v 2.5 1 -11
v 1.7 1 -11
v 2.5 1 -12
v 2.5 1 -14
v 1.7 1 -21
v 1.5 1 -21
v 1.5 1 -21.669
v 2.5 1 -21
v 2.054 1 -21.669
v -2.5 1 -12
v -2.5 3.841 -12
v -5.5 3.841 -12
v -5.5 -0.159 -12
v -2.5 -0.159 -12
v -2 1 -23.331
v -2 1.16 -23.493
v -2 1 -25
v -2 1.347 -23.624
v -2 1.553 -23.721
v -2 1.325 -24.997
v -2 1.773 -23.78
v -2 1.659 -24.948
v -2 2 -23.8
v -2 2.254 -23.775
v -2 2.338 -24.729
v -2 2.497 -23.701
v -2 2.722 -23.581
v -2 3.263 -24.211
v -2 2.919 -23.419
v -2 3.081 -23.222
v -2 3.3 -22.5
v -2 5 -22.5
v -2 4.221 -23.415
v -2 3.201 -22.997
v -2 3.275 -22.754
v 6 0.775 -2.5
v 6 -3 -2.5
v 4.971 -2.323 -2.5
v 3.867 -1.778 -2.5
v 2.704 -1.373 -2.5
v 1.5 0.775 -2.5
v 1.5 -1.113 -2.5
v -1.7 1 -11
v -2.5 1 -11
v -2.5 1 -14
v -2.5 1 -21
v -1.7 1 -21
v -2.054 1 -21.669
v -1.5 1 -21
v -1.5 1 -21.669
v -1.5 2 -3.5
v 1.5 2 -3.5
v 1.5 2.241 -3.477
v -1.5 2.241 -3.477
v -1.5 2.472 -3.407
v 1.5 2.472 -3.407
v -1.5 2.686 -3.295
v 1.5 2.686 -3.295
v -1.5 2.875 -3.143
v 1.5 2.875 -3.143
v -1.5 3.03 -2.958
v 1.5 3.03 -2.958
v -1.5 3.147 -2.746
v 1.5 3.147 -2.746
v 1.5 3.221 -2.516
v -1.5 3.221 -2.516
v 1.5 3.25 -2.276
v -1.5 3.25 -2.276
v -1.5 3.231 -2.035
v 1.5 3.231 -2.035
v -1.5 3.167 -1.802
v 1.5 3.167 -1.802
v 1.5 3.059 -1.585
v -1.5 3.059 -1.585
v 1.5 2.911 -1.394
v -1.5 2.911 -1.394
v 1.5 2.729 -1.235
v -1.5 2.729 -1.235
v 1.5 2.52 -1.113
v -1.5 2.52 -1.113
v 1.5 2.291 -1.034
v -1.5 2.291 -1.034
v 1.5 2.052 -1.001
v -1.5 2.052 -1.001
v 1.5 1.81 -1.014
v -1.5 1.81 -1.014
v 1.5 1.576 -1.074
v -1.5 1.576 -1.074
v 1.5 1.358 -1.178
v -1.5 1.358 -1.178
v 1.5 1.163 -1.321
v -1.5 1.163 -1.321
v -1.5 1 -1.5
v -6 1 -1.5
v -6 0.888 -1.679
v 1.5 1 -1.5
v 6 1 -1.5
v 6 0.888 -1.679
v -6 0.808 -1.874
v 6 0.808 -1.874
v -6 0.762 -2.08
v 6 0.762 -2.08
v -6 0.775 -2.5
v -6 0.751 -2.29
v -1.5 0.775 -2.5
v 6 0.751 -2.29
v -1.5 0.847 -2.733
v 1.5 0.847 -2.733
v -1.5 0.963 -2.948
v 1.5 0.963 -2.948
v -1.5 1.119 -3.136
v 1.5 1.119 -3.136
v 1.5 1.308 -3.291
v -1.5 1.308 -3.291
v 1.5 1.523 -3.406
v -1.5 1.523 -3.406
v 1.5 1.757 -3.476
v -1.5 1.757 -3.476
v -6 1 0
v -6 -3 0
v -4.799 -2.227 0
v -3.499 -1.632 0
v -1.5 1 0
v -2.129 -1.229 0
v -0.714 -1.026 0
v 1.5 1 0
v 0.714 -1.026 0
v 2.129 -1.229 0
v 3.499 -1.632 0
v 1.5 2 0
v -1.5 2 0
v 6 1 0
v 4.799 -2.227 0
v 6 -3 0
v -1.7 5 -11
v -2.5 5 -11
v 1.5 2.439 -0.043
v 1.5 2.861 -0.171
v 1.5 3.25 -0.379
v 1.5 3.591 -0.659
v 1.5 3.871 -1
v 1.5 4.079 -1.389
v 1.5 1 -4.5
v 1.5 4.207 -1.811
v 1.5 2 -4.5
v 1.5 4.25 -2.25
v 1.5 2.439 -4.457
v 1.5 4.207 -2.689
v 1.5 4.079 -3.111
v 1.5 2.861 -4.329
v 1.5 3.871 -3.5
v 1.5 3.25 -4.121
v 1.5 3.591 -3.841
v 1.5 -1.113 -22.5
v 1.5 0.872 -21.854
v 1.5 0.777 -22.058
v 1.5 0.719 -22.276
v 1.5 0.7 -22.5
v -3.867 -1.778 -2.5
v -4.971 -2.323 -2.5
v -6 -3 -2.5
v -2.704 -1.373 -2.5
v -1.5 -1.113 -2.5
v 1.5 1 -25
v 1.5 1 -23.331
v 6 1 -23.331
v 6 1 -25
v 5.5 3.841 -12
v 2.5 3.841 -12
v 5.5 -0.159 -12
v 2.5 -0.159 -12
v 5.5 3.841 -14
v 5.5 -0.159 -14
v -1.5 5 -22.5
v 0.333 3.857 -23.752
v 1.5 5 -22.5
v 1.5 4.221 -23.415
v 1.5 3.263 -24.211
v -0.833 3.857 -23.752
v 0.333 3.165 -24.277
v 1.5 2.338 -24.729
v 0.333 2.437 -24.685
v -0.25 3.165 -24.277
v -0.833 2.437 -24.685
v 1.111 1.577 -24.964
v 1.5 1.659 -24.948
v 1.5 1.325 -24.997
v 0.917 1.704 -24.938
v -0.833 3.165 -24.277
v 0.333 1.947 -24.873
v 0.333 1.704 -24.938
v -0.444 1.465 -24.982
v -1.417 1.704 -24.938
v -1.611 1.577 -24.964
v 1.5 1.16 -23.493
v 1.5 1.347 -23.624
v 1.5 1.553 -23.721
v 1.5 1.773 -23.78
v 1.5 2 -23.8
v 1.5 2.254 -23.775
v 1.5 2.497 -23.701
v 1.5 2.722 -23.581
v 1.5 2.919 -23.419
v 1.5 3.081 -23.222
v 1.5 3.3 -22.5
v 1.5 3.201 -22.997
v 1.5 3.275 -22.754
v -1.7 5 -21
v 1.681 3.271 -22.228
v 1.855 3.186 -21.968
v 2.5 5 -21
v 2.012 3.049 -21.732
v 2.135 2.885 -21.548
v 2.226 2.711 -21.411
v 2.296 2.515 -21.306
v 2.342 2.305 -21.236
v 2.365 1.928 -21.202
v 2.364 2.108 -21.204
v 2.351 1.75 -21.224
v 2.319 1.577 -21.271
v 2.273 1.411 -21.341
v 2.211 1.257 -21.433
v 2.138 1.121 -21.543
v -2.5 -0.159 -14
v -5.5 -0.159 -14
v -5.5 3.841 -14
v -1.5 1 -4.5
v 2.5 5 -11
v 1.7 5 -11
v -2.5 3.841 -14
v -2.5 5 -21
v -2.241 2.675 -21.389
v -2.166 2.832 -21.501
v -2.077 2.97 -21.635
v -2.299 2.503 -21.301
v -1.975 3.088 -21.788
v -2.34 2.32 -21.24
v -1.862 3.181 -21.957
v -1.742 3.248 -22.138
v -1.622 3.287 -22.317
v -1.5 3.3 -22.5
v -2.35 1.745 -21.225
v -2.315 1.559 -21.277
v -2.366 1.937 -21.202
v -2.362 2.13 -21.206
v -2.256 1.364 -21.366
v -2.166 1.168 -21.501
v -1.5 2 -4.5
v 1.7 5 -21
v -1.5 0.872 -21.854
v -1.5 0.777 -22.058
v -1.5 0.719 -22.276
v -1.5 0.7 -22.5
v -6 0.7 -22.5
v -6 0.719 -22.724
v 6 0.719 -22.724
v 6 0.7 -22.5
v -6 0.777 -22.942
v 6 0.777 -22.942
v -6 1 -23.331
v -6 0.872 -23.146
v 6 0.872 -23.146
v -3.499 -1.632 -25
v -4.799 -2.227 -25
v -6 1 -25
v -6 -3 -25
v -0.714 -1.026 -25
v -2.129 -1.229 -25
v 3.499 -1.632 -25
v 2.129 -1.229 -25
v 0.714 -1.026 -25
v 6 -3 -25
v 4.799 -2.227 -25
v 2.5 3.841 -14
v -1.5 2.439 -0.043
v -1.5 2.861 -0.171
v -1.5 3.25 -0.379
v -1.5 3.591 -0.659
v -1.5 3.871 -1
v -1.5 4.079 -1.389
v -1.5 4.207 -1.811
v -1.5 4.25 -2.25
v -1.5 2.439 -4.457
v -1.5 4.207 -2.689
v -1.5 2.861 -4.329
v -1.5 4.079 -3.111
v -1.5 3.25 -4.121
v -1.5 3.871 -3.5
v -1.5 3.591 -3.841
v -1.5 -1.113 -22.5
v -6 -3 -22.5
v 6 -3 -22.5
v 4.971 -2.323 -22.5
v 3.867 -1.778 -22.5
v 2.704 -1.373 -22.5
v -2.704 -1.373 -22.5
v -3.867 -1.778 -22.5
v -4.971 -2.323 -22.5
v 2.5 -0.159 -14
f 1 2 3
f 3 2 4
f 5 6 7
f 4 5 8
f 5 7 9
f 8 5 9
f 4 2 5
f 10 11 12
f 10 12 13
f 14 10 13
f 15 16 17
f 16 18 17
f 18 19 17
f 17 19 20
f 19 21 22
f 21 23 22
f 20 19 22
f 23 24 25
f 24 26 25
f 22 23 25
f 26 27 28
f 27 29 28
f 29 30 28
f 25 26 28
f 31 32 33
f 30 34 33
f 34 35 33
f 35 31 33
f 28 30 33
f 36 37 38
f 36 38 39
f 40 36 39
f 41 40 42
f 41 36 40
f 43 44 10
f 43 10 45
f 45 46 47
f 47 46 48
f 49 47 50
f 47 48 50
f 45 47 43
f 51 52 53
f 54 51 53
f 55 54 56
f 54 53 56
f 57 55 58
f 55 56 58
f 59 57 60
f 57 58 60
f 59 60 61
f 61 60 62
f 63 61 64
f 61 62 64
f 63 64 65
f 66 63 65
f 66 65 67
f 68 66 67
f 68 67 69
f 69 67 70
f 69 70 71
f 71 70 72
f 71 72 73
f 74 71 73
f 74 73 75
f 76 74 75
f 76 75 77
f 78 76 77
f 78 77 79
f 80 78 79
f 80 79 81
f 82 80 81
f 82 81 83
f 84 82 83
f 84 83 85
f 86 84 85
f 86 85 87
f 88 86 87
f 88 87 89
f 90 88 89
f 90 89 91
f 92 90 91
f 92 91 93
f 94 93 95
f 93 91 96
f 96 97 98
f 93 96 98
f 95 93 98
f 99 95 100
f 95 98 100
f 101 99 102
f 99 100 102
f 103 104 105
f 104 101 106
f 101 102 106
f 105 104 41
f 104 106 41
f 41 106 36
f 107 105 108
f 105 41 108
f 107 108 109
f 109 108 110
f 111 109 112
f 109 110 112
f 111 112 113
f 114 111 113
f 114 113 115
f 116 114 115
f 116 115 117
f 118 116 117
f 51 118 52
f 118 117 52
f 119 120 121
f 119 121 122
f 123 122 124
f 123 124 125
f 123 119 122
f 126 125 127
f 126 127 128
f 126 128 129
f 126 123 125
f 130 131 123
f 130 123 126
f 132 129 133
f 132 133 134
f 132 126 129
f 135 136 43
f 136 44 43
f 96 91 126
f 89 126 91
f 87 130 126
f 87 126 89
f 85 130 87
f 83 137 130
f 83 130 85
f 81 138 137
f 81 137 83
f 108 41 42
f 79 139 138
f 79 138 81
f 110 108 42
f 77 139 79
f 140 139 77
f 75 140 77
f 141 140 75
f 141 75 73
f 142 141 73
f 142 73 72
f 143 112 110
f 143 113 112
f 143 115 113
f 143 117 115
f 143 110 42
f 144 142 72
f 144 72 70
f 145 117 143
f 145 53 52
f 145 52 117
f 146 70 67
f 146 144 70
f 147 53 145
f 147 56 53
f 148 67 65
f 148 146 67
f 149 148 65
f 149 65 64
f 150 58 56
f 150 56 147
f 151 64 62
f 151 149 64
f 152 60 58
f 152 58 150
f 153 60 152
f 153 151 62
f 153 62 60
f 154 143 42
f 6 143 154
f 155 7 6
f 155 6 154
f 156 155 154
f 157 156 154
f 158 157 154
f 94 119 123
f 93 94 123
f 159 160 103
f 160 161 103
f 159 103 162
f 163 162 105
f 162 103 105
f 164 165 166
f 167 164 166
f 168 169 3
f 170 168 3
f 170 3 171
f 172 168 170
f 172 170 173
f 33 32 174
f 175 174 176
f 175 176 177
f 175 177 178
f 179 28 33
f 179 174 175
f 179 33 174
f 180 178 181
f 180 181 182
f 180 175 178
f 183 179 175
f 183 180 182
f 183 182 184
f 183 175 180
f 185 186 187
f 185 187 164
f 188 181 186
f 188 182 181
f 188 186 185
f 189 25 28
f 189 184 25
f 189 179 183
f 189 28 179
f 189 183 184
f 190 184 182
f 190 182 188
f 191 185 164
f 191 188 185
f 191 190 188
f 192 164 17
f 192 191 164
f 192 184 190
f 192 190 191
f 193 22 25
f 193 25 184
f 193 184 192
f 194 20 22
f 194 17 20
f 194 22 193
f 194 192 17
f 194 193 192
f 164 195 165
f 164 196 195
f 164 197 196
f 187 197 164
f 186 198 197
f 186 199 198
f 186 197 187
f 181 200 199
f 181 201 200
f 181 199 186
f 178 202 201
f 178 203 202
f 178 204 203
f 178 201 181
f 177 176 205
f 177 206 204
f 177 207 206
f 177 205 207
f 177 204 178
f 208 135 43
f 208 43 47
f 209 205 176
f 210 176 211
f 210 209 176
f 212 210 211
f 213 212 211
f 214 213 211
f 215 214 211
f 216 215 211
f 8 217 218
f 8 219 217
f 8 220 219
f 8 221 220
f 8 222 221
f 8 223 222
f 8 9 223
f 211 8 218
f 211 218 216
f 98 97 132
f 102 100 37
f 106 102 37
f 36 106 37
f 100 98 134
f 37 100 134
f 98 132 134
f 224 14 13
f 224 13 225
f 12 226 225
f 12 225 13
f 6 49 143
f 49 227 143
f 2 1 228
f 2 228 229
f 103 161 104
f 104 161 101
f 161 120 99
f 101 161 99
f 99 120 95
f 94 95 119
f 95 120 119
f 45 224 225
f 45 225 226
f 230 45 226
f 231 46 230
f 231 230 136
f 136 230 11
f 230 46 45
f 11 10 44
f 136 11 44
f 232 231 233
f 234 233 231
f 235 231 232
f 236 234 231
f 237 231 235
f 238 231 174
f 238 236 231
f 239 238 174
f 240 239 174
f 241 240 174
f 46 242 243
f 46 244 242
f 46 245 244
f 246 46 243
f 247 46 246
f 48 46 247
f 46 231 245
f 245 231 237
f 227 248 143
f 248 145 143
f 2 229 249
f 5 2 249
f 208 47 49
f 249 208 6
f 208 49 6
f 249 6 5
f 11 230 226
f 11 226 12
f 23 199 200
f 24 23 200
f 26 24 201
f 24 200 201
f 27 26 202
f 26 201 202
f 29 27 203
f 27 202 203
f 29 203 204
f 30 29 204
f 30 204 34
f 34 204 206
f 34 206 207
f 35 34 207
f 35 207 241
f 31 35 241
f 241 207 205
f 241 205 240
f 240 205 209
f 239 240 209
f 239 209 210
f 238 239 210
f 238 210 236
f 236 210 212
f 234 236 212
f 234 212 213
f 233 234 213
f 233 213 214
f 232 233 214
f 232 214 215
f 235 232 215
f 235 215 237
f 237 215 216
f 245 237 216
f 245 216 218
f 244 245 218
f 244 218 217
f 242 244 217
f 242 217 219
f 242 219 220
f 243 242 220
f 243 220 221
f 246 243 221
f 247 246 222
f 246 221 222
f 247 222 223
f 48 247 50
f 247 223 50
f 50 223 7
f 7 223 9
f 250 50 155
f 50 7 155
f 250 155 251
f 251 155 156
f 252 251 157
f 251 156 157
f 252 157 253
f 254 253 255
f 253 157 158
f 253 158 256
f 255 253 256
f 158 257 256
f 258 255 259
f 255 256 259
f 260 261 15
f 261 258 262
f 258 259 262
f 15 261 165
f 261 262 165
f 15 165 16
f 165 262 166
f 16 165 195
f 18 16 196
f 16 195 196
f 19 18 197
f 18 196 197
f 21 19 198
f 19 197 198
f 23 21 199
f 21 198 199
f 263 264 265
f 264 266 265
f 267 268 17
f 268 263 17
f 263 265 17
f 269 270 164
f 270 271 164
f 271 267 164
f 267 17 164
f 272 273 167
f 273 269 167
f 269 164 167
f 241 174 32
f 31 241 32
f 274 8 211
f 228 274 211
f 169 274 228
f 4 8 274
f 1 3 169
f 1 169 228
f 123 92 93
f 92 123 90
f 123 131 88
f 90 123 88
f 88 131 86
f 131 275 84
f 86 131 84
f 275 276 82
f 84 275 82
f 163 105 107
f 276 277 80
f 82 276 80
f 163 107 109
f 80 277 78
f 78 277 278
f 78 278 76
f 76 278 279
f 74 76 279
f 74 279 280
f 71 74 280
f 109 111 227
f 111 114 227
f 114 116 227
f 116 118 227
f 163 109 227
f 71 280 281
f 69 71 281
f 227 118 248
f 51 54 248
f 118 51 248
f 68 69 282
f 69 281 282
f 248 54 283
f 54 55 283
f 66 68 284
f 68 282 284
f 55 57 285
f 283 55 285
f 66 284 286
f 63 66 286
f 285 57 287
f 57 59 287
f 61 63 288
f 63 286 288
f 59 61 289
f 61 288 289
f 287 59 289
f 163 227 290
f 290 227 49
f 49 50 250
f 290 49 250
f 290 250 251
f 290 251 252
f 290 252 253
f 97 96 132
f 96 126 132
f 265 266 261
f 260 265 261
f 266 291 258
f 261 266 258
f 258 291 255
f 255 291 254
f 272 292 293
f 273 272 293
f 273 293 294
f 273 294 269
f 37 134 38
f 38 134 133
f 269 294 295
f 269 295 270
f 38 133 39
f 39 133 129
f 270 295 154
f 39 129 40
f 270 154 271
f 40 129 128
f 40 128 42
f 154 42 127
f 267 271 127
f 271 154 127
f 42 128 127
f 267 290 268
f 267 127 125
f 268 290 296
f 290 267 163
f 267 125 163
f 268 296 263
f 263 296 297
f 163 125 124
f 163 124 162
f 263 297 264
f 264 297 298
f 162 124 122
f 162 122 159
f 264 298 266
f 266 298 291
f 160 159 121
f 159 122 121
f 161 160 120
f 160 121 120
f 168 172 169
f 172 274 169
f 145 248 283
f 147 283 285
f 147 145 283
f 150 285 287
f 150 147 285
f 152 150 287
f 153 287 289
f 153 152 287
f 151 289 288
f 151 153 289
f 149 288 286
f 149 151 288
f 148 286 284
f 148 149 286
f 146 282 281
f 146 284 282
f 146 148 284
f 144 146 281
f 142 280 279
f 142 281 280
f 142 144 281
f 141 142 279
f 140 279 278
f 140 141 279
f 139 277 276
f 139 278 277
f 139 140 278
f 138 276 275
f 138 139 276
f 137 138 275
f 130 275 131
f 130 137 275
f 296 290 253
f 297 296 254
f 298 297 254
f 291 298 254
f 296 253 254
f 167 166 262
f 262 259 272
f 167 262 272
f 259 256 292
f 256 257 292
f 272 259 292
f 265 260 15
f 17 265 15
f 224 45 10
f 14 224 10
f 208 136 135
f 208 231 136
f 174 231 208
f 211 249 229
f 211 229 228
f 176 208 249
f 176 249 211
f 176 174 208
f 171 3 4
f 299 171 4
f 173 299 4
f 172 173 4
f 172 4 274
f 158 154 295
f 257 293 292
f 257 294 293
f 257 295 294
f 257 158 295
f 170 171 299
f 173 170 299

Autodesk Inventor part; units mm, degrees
ref_plane "YZ Plane" through (0, 0, 0) normal (1, 0, 0) x (0, 1, 0)
ref_plane "XZ Plane" through (0, 0, 0) normal (0, 1, 0) x (-1, 0, 0)
sketch "Sketch1" plane through (0, 0, 0) normal (0, 0, 1) x (1, 0, 0)
  line L0 (-6, 1) -> (6, 1)
  line L1 (6, 1) -> (6, -1)
  line L2 (6, -1) -> (-6, -1)
  line L3 (-6, -1) -> (-6, 1)
  line L4 (-6, 1) -> (6, -1) construction
  line L5 (6, 1) -> (-6, -1) construction
  line L6 (-6, -1) -> (-6, -3)
  line L7 (6, -1) -> (6, -3)
  arc A0 (6, -3) -> (-6, -3) centre (0, -11) ccw
  point P0 (0, 0)
  dimension "d0" = 12
  dimension "d1" = 2
  dimension "d2" = 2
  dimension "d3" = 2
extrude "Extrusion1" add sketch "Sketch1" against normal blind 25
sketch "Sketch2" plane through (-6, 1, 0) normal (0, 1, 0) x (1, 0, 0)
  line L0 (12, 0) -> (12, 25) projected
  line L1 (0, 0) -> (0, 25) projected
  line L2 (0, 0) -> (0, 2.5)
  line L3 (12, 0) -> (12, 2.5)
  line L4 (0, 25) -> (0, 22.5)
  line L5 (12, 25) -> (12, 22.5)
  line L6 (0, 2.5) -> (4.5, 2.5)
  line L7 (4.5, 2.5) -> (4.5, 22.5)
  line L8 (4.5, 22.5) -> (0, 22.5)
  line L9 (0, 22.5) -> (0, 2.5)
  line L10 (12, 2.5) -> (7.5, 2.5)
  line L11 (7.5, 2.5) -> (7.5, 22.5)
  line L12 (7.5, 22.5) -> (12, 22.5)
  line L13 (12, 22.5) -> (12, 2.5)
  point P0 (6, 0)
  dimension "d6" = 2.5
  dimension "d7" = 2.5
  dimension "d8" = 2.5
  dimension "d9" = 2.5
  dimension "d10" = 12
  dimension "d11" = 4.5
  dimension "d12" = 4.5
extrude "Extrusion2" cut sketch "Sketch2" against normal blind 25
sketch "Sketch3" plane through (-6, 1, 0) normal (0, 1, 0) x (1, 0, 0)
  line L0 (7.5, 2.5) -> (7.5, 22.5) projected
  line L1 (4.5, 22.5) -> (4.5, 2.5) projected
  line L2 (0, 0) -> (0, 2.5) projected
  line L3 (4.5, 2.5) -> (4.5, 3.5)
  line L4 (7.5, 2.5) -> (7.5, 3.5)
  line L5 (4.5, 3.5) -> (4.5, 5)
  line L6 (4.5, 5) -> (5, 5)
  line L7 (5, 5) -> (5, 3.5)
  line L8 (5, 3.5) -> (4.5, 3.5)
  line L9 (7.5, 3.5) -> (7.5, 5)
  line L10 (7.5, 5) -> (7, 5)
  line L11 (7, 5) -> (7, 3.5)
  line L12 (7, 3.5) -> (7.5, 3.5)
  line L13 (4.5, 2.5) -> (4.5, 7)
  line L14 (4.5, 7) -> (0, 7)
  line L15 (0, 7) -> (0, 8.5)
  line L16 (0, 8.5) -> (4.5, 8.5)
  line L17 (7.5, 7) -> (12, 7)
  line L18 (12, 7) -> (12, 8.5)
  line L19 (12, 8.5) -> (7.5, 8.5)
  line L20 (4.5, 7) -> (4.5, 21)
  line L21 (7.5, 7) -> (7.5, 21)
  line L22 (4.5, 21) -> (7.5, 21)
  line L23 (7.5, 21) -> (7.5, 22.5)
  line L24 (7.5, 22.5) -> (4.5, 22.5)
  line L25 (4.5, 22.5) -> (4.5, 21)
  line L26 (4.5, 21) -> (3.5, 21)
  line L27 (3.5, 21) -> (3.5, 11)
  line L28 (3.5, 11) -> (4.5, 11)
  line L29 (4.5, 11) -> (4.5, 21)
  line L30 (7.5, 21) -> (8.5, 21)
  line L31 (8.5, 21) -> (8.5, 11)
  line L32 (8.5, 11) -> (7.5, 11)
  line L33 (7.5, 11) -> (7.5, 21)
  line L34 (3.5, 21) -> (4.5, 22.5)
  line L35 (7.5, 22.5) -> (8.5, 21)
  line L36 (7.5, 5) -> (8, 5)
  line L37 (8, 5) -> (8, 3.5)
  line L38 (8, 3.5) -> (7.5, 3.5)
  line L39 (4.5, 5) -> (4, 5)
  line L40 (4, 5) -> (4, 3.5)
  line L41 (4, 3.5) -> (5, 3.5)
  point P0 (12, 25)
  point P1 (12, 0)
  point P2 (6, 0)
  dimension "d15" = 1
  dimension "d16" = 1.5
  dimension "d17" = 0.5
  dimension "d18" = 0.5
  dimension "d19" = 4.5
  dimension "d20" = 1.5
  dimension "d21" = 14
  dimension "d22" = 4.5
  dimension "d23" = 4.5
  dimension "d24" = 14
  dimension "d25" = 25
  dimension "d26" = 1.5
  dimension "d29" = 1
  dimension "d30" = 10
  dimension "d31" = 1
  dimension "d34" = 0.5
  dimension "d35" = 0.5
  dimension "d50" = 10
extrude "Extrusion3" add sketch "Sketch3" along normal blind 4 contours L0 L30 L31 L32 | L22 L1 L24 L0 | L0 L35 L30 | L26 L34 L1 | L1 L28 L27 L26
ref_plane "Work Plane1" through (-1.5, 1, -12.5) normal (-1, 0, 0) x (0, 0, 1)
sketch "Sketch8" plane through (-2.5, -1.3175, -11) normal (-1, 0, 0) x (0, 0, 1)
  line L0 (-10, 0) -> (0, 6.3175)
  line L1 (-10, 6.3175) -> (-11.5, 6.3175) projected
  line L2 (0, 0) -> (-10, 0) projected
  line L3 (-10, 6.3175) -> (0, 0)
  line L4 (-4, 1.1588) -> (-4, 5.1588)
  line L5 (-6, 1.1588) -> (-4, 5.1588) construction
  line L6 (-4, 1.1588) -> (-6, 5.1588) construction
  line L7 (-5, 3.1588) -> (-2, 3.1588)
  line L8 (-3, 5.1588) -> (-1, 5.1588)
  line L9 (-1, 5.1588) -> (-1, 1.1588)
  line L10 (-1, 1.1588) -> (-3, 1.1588)
  line L11 (-3, 1.1588) -> (-3, 5.1588)
  line L12 (-3, 5.1588) -> (-1, 1.1588) construction
  line L13 (-1, 5.1588) -> (-3, 1.1588) construction
  line L14 (0, 2.3175) -> (0, 6.3175) projected
  line L15 (-10, 6.3175) -> (0, 6.3175) projected
  line L16 (-6, 5.1588) -> (-3, 5.1588)
  point P0 (11, 1.3175)
  dimension "d51" = 2
  dimension "d52" = 4
  dimension "d103" = 3
  dimension "d104" = 2
  dimension "d105" = 4
extrude "Extrusion8" add sketch "Sketch8" along normal blind 3 contours L10 L11 L3 | L3 L11 L0 L8 L9 L10 | L11 L8 L0
sketch "Sketch9" plane through (2.5, -1.3175, -21) normal (1, 0, 0) x (0, 0, -1)
  line L0 (-10, 6.3175) -> (0, 0)
  line L1 (0, 2.3175) -> (0, 6.3175) projected
  line L2 (0, 0) -> (-10, 0) projected
  line L3 (0, 6.3175) -> (-10, 0)
  line L4 (-6, 5.1588) -> (-6, 1.1588)
  line L5 (-4, 5.1588) -> (-6, 1.1588) construction
  line L6 (-6, 5.1588) -> (-4, 1.1588) construction
  line L7 (-5, 3.1588) -> (-8, 3.1588)
  line L8 (-9, 2.3175) -> (-9, 1.1588) projected
  line L9 (-7, 5.1588) -> (-9, 5.1588)
  line L10 (-9, 5.1588) -> (-9, 1.1588)
  line L11 (-9, 1.1588) -> (-7, 1.1588)
  line L12 (-7, 1.1588) -> (-7, 5.1588)
  line L13 (-7, 5.1588) -> (-9, 1.1588) construction
  line L14 (-9, 5.1588) -> (-7, 1.1588) construction
  point P0 (-21, 1.3175)
  dimension "d55" = 2
  dimension "d56" = 4
  dimension "d106" = 3
extrude "Extrusion9" add sketch "Sketch9" along normal blind 3 contours L12 L3 L11 L8 L10 L9 L0 | L0 L9 L12 | L12 L11 L3
ref_plane "Work Plane2" through (-2, 1, -11) normal (1, 0, 0) x (0, 0, -1)
sketch "Sketch12" plane through (-2, 1, -11) normal (1, 0, 0) x (0, 0, -1)
  line L0 (11.5, 0) -> (11.5, 4) projected
  line L1 (14, -4) -> (14, 0) projected
  line L2 (14, 0) -> (11.5, 4)
  line L3 (11.5, 0) -> (14, 0) projected
  line L4 (14, 0) -> (11.5, 0)
  line L5 (11.5, 4) -> (12.8115, 3.0819) construction
  line L6 (12.8115, 3.0819) -> (14.0937, 1.3588) construction
  line L7 (14.0937, 1.3588) -> (14, 0) construction
  spline S0 degree 3 poles (11.5, 4) (12.8115, 3.0819) (14.0937, 1.3588) (14, 0) knots 1 1 1 1 2 2 2 2
  point P0 (-11, -1)
extrude "Extrusion12" add sketch "Sketch12" along normal up to surface (3.5 mm away)
sketch "Sketch15" plane through (2.5, -1.3175, -21) normal (1, 0, 0) x (0, 0, -1)
  line L0 (1.5, 2.3175) -> (4, 2.3175) projected
  line L1 (1.5, 2.3175) -> (1.5, 6.3175) projected
  line L2 (4, 2.3175) -> (1.5, 2.3175) projected
  line L3 (1.5, 2.3175) -> (1.5, 3.3175)
  circle A0 centre (1.5, 3.3175) radius 1.3
  point P0 (-21, 1.3175)
  dimension "d77" = 1
  dimension "d78" = 2.6
extrude "Extrusion14" cut sketch "Sketch15" against normal up to surface (12 mm away) from surface at 3.5
sketch "Sketch16" plane through (-6, 5, 0) normal (0, 1, 0) x (1, 0, 0)
  line L0 (3.5, 11) -> (4.5, 11) projected
  line L1 (4.5, 11) -> (4.5, 21) projected
  line L2 (7.5, 21) -> (7.5, 11) projected
  line L3 (7.5, 11) -> (8.5, 11) projected
  line L4 (4.5, 11) -> (4.3, 11)
  line L5 (4.3, 11) -> (4.3, 21)
  line L6 (4.3, 21) -> (4.5, 21)
  line L7 (7.5, 11) -> (7.5, 21) projected
  line L8 (7.5, 11) -> (7.7, 11)
  line L9 (7.7, 11) -> (7.7, 21)
  line L10 (7.7, 21) -> (7.5, 21)
  line L11 (7.5, 21) -> (7.5, 11)
  point P0 (6, 0)
  dimension "d81" = 0.2
  dimension "d82" = 0.2
  dimension "d83" = 0.2
extrude "Extrusion15" cut sketch "Sketch16" against normal up to surface (4 mm away)
sketch "Sketch17" plane through (1.5, -1.1131, -2.5) normal (1, 0, 0) x (0, 0, -1)
  line L0 (0, 2.1131) -> (18.5, 2.1131) projected
  line L1 (-2.5, 2.1131) -> (0, 2.1131) projected
  line L2 (-2.5, 2.1131) -> (-2.5, 3.1131)
  line L3 (-2.5, 3.1131) -> (-1.5, 3.1131)
  line L4 (-1.5, 3.1131) -> (1, 3.1131)
  line L5 (1, 3.1131) -> (2, 3.1131)
  line L6 (-0.25, 3.1131) -> (-0.25, 4.3631)
  line L7 (-0.25, 4.3631) -> (-0.25, 5.3631)
  line L8 (-2.5, 2.1131) -> (2, 2.1131)
  line L9 (2, 3.1131) -> (2, 2.1131)
  arc A0 (2, 3.1131) -> (-2.5, 3.1131) centre (-0.25, 3.1131) ccw
  dimension "d94" = 1
  dimension "d95" = 1
  dimension "d96" = 2.5
  dimension "d97" = 1
  dimension "d98" = 1.25
  dimension "d99" = 1
extrude "Extrusion16" add sketch "Sketch17" against normal up to surface (3 mm away)
sketch "Sketch19" plane through (6, -3, 0) normal (1, 0, 0) x (0, 0, -1)
  arc A0 (4.5, 5) -> (0, 5) centre (2.25, 5) ccw projected
  circle A1 centre (2.25, 5) radius 1.25
  point P0 (0, 3)
  dimension "d100" = 2.5
extrude "Extrusion17" cut sketch "Sketch19" against normal up to surface (12 mm away)
equation "\"d7\" = d6"
equation "\"d8\" = d6"
equation "\"d9\" = d6"
equation "\"d12\" = d11"
equation "\"d18\" = d17"
equation "\"d22\" = d23"
equation "\"d24\" = d21"
equation "\"d31\" = d29"
equation "\"d50\" = d30"
equation "\"d82\" = d81"
properties part number "back_pack_3.1"
